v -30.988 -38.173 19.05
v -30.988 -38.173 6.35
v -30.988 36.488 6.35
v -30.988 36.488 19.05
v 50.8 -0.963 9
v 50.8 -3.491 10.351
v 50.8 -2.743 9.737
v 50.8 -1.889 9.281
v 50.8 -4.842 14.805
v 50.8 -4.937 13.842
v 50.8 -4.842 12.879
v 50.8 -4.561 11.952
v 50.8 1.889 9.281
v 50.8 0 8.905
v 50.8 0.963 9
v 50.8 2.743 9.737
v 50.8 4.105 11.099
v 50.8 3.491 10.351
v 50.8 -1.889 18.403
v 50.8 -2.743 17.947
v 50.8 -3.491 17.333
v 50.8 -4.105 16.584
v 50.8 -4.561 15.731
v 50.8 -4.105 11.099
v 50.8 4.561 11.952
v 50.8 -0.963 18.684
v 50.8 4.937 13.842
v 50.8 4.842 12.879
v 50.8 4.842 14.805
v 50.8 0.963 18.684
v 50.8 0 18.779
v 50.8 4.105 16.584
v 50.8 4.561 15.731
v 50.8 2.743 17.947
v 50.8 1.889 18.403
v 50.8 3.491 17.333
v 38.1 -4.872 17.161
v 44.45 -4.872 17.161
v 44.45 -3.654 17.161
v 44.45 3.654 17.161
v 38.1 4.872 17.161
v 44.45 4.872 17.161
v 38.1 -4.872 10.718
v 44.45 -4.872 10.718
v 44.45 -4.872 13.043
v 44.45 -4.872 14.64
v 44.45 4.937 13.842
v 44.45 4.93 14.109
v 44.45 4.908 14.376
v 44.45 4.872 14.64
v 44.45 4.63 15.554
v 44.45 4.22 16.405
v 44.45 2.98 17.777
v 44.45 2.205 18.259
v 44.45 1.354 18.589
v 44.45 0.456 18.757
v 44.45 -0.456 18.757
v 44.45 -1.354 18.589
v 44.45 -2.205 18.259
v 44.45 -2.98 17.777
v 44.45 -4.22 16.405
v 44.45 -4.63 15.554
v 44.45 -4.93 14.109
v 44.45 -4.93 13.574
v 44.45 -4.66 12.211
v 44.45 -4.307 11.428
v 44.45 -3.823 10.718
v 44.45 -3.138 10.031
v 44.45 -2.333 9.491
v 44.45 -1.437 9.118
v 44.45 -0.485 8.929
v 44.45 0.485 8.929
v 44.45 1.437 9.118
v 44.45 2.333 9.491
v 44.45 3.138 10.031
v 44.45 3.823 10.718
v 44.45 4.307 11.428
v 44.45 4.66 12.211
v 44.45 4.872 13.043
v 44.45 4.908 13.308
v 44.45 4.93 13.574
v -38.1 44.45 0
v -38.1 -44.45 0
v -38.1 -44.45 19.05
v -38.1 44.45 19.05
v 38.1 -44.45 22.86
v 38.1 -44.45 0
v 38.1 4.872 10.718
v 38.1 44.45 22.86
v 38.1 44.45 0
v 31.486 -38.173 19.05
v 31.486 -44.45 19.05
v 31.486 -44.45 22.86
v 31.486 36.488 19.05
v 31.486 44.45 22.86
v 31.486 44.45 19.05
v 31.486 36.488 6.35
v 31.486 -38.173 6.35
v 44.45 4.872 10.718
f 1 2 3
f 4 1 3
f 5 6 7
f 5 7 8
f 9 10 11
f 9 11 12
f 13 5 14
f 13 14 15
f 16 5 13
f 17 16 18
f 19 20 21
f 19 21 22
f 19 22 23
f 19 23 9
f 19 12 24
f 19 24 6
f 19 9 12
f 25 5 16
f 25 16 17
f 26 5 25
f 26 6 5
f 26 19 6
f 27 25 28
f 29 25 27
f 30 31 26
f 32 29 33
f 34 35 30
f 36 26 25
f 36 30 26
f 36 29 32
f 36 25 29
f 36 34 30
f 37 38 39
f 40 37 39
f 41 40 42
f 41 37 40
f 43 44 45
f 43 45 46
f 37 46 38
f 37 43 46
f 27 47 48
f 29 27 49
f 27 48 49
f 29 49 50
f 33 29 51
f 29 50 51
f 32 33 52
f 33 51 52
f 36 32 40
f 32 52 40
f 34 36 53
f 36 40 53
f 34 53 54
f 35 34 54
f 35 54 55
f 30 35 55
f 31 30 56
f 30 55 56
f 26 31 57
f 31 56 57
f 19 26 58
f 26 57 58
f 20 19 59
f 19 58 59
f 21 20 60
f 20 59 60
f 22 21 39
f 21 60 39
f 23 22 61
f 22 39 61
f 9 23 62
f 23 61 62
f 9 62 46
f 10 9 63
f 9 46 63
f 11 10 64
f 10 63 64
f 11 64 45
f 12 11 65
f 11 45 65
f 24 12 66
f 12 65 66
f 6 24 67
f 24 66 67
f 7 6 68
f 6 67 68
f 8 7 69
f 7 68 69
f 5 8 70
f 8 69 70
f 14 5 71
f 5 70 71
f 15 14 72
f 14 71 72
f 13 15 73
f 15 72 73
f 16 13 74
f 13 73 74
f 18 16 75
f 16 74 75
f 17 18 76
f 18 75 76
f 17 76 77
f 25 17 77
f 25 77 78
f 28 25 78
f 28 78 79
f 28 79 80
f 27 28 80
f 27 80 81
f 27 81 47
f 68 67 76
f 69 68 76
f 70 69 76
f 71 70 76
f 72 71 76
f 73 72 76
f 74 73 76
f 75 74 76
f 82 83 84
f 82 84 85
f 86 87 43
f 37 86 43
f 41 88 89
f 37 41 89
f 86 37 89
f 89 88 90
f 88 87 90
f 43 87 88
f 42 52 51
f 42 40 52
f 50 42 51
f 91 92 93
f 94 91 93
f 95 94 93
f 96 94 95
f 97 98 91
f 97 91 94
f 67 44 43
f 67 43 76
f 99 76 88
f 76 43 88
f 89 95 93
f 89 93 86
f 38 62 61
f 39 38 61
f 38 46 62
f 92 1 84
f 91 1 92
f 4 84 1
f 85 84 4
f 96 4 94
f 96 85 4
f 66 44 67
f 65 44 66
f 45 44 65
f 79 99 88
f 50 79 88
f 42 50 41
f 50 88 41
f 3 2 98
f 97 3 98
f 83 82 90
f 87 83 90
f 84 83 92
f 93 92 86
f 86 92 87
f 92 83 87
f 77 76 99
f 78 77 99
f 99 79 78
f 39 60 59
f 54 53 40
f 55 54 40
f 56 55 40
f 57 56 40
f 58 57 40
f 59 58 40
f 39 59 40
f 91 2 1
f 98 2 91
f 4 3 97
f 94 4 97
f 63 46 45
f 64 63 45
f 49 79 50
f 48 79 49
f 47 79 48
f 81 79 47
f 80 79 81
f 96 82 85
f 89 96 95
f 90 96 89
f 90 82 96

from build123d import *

# Parameters (mm, degrees)
F0_W      = 76.2
F0_H      = 88.9
F1_DEPTH  = 6.35
F2_W      = 6.6139022768
F2_H      = 88.9
F3_DEPTH  = 16.51
F4_W      = 69.5860977232
F4_H      = 6.2766113102
F5_DEPTH  = 12.7
F6_W      = 7.1120927989
F6_H      = 82.6233886898
F7_DEPTH  = 12.7
F8_W      = 62.4740049243
F8_H      = 7.9619140148
F9_DEPTH  = 12.7
F10_W     = 9.7436904907
F10_H     = 6.4433701336
F11_DEPTH = 6.35
F12_R     = 4.9368995646
F13_DEPTH = 6.35


with BuildPart() as f1:
    # F0 (on Top) → F1 (new body)
    with BuildSketch(Plane.XY):
        Rectangle(F0_W, F0_H)
    extrude(amount=F1_DEPTH)

    # F2 (on face) → F3 (join)
    with BuildSketch(Plane.XY.offset(6.35)):
        with Locations((34.7930488616, 0)):
            Rectangle(F2_W, F2_H)
    extrude(amount=F3_DEPTH)

    # F4 (on face) → F5 (join)
    with BuildSketch(Plane.XY.offset(6.35)):
        with Locations((-3.3069511384, -41.3116943449)):
            Rectangle(F4_W, F4_H)
    extrude(amount=F5_DEPTH)

    # F6 (on face) → F7 (join)
    with BuildSketch(Plane.XY.offset(6.35)):
        with Locations((-34.5439536005, 3.1383056551)):
            Rectangle(F6_W, F6_H)
    extrude(amount=F7_DEPTH)

    # F8 (on face) → F9 (join)
    with BuildSketch(Plane.XY.offset(6.35)):
        with Locations((0.2490952611, 40.4690429926)):
            Rectangle(F8_W, F8_H)
    extrude(amount=F9_DEPTH)

    # F10 (on face) → F11 (join)
    with BuildSketch(Plane.YZ.offset(38.1)):
        with Locations((0, 13.9397662133)):
            Rectangle(F10_W, F10_H)
    extrude(amount=F11_DEPTH)

    # F12 (on face) → F13 (join)
    with BuildSketch(Plane.YZ.offset(44.45)):
        with Locations((0, 13.8416578993)):
            Circle(F12_R)
    extrude(amount=F13_DEPTH)


solid = f1.part
